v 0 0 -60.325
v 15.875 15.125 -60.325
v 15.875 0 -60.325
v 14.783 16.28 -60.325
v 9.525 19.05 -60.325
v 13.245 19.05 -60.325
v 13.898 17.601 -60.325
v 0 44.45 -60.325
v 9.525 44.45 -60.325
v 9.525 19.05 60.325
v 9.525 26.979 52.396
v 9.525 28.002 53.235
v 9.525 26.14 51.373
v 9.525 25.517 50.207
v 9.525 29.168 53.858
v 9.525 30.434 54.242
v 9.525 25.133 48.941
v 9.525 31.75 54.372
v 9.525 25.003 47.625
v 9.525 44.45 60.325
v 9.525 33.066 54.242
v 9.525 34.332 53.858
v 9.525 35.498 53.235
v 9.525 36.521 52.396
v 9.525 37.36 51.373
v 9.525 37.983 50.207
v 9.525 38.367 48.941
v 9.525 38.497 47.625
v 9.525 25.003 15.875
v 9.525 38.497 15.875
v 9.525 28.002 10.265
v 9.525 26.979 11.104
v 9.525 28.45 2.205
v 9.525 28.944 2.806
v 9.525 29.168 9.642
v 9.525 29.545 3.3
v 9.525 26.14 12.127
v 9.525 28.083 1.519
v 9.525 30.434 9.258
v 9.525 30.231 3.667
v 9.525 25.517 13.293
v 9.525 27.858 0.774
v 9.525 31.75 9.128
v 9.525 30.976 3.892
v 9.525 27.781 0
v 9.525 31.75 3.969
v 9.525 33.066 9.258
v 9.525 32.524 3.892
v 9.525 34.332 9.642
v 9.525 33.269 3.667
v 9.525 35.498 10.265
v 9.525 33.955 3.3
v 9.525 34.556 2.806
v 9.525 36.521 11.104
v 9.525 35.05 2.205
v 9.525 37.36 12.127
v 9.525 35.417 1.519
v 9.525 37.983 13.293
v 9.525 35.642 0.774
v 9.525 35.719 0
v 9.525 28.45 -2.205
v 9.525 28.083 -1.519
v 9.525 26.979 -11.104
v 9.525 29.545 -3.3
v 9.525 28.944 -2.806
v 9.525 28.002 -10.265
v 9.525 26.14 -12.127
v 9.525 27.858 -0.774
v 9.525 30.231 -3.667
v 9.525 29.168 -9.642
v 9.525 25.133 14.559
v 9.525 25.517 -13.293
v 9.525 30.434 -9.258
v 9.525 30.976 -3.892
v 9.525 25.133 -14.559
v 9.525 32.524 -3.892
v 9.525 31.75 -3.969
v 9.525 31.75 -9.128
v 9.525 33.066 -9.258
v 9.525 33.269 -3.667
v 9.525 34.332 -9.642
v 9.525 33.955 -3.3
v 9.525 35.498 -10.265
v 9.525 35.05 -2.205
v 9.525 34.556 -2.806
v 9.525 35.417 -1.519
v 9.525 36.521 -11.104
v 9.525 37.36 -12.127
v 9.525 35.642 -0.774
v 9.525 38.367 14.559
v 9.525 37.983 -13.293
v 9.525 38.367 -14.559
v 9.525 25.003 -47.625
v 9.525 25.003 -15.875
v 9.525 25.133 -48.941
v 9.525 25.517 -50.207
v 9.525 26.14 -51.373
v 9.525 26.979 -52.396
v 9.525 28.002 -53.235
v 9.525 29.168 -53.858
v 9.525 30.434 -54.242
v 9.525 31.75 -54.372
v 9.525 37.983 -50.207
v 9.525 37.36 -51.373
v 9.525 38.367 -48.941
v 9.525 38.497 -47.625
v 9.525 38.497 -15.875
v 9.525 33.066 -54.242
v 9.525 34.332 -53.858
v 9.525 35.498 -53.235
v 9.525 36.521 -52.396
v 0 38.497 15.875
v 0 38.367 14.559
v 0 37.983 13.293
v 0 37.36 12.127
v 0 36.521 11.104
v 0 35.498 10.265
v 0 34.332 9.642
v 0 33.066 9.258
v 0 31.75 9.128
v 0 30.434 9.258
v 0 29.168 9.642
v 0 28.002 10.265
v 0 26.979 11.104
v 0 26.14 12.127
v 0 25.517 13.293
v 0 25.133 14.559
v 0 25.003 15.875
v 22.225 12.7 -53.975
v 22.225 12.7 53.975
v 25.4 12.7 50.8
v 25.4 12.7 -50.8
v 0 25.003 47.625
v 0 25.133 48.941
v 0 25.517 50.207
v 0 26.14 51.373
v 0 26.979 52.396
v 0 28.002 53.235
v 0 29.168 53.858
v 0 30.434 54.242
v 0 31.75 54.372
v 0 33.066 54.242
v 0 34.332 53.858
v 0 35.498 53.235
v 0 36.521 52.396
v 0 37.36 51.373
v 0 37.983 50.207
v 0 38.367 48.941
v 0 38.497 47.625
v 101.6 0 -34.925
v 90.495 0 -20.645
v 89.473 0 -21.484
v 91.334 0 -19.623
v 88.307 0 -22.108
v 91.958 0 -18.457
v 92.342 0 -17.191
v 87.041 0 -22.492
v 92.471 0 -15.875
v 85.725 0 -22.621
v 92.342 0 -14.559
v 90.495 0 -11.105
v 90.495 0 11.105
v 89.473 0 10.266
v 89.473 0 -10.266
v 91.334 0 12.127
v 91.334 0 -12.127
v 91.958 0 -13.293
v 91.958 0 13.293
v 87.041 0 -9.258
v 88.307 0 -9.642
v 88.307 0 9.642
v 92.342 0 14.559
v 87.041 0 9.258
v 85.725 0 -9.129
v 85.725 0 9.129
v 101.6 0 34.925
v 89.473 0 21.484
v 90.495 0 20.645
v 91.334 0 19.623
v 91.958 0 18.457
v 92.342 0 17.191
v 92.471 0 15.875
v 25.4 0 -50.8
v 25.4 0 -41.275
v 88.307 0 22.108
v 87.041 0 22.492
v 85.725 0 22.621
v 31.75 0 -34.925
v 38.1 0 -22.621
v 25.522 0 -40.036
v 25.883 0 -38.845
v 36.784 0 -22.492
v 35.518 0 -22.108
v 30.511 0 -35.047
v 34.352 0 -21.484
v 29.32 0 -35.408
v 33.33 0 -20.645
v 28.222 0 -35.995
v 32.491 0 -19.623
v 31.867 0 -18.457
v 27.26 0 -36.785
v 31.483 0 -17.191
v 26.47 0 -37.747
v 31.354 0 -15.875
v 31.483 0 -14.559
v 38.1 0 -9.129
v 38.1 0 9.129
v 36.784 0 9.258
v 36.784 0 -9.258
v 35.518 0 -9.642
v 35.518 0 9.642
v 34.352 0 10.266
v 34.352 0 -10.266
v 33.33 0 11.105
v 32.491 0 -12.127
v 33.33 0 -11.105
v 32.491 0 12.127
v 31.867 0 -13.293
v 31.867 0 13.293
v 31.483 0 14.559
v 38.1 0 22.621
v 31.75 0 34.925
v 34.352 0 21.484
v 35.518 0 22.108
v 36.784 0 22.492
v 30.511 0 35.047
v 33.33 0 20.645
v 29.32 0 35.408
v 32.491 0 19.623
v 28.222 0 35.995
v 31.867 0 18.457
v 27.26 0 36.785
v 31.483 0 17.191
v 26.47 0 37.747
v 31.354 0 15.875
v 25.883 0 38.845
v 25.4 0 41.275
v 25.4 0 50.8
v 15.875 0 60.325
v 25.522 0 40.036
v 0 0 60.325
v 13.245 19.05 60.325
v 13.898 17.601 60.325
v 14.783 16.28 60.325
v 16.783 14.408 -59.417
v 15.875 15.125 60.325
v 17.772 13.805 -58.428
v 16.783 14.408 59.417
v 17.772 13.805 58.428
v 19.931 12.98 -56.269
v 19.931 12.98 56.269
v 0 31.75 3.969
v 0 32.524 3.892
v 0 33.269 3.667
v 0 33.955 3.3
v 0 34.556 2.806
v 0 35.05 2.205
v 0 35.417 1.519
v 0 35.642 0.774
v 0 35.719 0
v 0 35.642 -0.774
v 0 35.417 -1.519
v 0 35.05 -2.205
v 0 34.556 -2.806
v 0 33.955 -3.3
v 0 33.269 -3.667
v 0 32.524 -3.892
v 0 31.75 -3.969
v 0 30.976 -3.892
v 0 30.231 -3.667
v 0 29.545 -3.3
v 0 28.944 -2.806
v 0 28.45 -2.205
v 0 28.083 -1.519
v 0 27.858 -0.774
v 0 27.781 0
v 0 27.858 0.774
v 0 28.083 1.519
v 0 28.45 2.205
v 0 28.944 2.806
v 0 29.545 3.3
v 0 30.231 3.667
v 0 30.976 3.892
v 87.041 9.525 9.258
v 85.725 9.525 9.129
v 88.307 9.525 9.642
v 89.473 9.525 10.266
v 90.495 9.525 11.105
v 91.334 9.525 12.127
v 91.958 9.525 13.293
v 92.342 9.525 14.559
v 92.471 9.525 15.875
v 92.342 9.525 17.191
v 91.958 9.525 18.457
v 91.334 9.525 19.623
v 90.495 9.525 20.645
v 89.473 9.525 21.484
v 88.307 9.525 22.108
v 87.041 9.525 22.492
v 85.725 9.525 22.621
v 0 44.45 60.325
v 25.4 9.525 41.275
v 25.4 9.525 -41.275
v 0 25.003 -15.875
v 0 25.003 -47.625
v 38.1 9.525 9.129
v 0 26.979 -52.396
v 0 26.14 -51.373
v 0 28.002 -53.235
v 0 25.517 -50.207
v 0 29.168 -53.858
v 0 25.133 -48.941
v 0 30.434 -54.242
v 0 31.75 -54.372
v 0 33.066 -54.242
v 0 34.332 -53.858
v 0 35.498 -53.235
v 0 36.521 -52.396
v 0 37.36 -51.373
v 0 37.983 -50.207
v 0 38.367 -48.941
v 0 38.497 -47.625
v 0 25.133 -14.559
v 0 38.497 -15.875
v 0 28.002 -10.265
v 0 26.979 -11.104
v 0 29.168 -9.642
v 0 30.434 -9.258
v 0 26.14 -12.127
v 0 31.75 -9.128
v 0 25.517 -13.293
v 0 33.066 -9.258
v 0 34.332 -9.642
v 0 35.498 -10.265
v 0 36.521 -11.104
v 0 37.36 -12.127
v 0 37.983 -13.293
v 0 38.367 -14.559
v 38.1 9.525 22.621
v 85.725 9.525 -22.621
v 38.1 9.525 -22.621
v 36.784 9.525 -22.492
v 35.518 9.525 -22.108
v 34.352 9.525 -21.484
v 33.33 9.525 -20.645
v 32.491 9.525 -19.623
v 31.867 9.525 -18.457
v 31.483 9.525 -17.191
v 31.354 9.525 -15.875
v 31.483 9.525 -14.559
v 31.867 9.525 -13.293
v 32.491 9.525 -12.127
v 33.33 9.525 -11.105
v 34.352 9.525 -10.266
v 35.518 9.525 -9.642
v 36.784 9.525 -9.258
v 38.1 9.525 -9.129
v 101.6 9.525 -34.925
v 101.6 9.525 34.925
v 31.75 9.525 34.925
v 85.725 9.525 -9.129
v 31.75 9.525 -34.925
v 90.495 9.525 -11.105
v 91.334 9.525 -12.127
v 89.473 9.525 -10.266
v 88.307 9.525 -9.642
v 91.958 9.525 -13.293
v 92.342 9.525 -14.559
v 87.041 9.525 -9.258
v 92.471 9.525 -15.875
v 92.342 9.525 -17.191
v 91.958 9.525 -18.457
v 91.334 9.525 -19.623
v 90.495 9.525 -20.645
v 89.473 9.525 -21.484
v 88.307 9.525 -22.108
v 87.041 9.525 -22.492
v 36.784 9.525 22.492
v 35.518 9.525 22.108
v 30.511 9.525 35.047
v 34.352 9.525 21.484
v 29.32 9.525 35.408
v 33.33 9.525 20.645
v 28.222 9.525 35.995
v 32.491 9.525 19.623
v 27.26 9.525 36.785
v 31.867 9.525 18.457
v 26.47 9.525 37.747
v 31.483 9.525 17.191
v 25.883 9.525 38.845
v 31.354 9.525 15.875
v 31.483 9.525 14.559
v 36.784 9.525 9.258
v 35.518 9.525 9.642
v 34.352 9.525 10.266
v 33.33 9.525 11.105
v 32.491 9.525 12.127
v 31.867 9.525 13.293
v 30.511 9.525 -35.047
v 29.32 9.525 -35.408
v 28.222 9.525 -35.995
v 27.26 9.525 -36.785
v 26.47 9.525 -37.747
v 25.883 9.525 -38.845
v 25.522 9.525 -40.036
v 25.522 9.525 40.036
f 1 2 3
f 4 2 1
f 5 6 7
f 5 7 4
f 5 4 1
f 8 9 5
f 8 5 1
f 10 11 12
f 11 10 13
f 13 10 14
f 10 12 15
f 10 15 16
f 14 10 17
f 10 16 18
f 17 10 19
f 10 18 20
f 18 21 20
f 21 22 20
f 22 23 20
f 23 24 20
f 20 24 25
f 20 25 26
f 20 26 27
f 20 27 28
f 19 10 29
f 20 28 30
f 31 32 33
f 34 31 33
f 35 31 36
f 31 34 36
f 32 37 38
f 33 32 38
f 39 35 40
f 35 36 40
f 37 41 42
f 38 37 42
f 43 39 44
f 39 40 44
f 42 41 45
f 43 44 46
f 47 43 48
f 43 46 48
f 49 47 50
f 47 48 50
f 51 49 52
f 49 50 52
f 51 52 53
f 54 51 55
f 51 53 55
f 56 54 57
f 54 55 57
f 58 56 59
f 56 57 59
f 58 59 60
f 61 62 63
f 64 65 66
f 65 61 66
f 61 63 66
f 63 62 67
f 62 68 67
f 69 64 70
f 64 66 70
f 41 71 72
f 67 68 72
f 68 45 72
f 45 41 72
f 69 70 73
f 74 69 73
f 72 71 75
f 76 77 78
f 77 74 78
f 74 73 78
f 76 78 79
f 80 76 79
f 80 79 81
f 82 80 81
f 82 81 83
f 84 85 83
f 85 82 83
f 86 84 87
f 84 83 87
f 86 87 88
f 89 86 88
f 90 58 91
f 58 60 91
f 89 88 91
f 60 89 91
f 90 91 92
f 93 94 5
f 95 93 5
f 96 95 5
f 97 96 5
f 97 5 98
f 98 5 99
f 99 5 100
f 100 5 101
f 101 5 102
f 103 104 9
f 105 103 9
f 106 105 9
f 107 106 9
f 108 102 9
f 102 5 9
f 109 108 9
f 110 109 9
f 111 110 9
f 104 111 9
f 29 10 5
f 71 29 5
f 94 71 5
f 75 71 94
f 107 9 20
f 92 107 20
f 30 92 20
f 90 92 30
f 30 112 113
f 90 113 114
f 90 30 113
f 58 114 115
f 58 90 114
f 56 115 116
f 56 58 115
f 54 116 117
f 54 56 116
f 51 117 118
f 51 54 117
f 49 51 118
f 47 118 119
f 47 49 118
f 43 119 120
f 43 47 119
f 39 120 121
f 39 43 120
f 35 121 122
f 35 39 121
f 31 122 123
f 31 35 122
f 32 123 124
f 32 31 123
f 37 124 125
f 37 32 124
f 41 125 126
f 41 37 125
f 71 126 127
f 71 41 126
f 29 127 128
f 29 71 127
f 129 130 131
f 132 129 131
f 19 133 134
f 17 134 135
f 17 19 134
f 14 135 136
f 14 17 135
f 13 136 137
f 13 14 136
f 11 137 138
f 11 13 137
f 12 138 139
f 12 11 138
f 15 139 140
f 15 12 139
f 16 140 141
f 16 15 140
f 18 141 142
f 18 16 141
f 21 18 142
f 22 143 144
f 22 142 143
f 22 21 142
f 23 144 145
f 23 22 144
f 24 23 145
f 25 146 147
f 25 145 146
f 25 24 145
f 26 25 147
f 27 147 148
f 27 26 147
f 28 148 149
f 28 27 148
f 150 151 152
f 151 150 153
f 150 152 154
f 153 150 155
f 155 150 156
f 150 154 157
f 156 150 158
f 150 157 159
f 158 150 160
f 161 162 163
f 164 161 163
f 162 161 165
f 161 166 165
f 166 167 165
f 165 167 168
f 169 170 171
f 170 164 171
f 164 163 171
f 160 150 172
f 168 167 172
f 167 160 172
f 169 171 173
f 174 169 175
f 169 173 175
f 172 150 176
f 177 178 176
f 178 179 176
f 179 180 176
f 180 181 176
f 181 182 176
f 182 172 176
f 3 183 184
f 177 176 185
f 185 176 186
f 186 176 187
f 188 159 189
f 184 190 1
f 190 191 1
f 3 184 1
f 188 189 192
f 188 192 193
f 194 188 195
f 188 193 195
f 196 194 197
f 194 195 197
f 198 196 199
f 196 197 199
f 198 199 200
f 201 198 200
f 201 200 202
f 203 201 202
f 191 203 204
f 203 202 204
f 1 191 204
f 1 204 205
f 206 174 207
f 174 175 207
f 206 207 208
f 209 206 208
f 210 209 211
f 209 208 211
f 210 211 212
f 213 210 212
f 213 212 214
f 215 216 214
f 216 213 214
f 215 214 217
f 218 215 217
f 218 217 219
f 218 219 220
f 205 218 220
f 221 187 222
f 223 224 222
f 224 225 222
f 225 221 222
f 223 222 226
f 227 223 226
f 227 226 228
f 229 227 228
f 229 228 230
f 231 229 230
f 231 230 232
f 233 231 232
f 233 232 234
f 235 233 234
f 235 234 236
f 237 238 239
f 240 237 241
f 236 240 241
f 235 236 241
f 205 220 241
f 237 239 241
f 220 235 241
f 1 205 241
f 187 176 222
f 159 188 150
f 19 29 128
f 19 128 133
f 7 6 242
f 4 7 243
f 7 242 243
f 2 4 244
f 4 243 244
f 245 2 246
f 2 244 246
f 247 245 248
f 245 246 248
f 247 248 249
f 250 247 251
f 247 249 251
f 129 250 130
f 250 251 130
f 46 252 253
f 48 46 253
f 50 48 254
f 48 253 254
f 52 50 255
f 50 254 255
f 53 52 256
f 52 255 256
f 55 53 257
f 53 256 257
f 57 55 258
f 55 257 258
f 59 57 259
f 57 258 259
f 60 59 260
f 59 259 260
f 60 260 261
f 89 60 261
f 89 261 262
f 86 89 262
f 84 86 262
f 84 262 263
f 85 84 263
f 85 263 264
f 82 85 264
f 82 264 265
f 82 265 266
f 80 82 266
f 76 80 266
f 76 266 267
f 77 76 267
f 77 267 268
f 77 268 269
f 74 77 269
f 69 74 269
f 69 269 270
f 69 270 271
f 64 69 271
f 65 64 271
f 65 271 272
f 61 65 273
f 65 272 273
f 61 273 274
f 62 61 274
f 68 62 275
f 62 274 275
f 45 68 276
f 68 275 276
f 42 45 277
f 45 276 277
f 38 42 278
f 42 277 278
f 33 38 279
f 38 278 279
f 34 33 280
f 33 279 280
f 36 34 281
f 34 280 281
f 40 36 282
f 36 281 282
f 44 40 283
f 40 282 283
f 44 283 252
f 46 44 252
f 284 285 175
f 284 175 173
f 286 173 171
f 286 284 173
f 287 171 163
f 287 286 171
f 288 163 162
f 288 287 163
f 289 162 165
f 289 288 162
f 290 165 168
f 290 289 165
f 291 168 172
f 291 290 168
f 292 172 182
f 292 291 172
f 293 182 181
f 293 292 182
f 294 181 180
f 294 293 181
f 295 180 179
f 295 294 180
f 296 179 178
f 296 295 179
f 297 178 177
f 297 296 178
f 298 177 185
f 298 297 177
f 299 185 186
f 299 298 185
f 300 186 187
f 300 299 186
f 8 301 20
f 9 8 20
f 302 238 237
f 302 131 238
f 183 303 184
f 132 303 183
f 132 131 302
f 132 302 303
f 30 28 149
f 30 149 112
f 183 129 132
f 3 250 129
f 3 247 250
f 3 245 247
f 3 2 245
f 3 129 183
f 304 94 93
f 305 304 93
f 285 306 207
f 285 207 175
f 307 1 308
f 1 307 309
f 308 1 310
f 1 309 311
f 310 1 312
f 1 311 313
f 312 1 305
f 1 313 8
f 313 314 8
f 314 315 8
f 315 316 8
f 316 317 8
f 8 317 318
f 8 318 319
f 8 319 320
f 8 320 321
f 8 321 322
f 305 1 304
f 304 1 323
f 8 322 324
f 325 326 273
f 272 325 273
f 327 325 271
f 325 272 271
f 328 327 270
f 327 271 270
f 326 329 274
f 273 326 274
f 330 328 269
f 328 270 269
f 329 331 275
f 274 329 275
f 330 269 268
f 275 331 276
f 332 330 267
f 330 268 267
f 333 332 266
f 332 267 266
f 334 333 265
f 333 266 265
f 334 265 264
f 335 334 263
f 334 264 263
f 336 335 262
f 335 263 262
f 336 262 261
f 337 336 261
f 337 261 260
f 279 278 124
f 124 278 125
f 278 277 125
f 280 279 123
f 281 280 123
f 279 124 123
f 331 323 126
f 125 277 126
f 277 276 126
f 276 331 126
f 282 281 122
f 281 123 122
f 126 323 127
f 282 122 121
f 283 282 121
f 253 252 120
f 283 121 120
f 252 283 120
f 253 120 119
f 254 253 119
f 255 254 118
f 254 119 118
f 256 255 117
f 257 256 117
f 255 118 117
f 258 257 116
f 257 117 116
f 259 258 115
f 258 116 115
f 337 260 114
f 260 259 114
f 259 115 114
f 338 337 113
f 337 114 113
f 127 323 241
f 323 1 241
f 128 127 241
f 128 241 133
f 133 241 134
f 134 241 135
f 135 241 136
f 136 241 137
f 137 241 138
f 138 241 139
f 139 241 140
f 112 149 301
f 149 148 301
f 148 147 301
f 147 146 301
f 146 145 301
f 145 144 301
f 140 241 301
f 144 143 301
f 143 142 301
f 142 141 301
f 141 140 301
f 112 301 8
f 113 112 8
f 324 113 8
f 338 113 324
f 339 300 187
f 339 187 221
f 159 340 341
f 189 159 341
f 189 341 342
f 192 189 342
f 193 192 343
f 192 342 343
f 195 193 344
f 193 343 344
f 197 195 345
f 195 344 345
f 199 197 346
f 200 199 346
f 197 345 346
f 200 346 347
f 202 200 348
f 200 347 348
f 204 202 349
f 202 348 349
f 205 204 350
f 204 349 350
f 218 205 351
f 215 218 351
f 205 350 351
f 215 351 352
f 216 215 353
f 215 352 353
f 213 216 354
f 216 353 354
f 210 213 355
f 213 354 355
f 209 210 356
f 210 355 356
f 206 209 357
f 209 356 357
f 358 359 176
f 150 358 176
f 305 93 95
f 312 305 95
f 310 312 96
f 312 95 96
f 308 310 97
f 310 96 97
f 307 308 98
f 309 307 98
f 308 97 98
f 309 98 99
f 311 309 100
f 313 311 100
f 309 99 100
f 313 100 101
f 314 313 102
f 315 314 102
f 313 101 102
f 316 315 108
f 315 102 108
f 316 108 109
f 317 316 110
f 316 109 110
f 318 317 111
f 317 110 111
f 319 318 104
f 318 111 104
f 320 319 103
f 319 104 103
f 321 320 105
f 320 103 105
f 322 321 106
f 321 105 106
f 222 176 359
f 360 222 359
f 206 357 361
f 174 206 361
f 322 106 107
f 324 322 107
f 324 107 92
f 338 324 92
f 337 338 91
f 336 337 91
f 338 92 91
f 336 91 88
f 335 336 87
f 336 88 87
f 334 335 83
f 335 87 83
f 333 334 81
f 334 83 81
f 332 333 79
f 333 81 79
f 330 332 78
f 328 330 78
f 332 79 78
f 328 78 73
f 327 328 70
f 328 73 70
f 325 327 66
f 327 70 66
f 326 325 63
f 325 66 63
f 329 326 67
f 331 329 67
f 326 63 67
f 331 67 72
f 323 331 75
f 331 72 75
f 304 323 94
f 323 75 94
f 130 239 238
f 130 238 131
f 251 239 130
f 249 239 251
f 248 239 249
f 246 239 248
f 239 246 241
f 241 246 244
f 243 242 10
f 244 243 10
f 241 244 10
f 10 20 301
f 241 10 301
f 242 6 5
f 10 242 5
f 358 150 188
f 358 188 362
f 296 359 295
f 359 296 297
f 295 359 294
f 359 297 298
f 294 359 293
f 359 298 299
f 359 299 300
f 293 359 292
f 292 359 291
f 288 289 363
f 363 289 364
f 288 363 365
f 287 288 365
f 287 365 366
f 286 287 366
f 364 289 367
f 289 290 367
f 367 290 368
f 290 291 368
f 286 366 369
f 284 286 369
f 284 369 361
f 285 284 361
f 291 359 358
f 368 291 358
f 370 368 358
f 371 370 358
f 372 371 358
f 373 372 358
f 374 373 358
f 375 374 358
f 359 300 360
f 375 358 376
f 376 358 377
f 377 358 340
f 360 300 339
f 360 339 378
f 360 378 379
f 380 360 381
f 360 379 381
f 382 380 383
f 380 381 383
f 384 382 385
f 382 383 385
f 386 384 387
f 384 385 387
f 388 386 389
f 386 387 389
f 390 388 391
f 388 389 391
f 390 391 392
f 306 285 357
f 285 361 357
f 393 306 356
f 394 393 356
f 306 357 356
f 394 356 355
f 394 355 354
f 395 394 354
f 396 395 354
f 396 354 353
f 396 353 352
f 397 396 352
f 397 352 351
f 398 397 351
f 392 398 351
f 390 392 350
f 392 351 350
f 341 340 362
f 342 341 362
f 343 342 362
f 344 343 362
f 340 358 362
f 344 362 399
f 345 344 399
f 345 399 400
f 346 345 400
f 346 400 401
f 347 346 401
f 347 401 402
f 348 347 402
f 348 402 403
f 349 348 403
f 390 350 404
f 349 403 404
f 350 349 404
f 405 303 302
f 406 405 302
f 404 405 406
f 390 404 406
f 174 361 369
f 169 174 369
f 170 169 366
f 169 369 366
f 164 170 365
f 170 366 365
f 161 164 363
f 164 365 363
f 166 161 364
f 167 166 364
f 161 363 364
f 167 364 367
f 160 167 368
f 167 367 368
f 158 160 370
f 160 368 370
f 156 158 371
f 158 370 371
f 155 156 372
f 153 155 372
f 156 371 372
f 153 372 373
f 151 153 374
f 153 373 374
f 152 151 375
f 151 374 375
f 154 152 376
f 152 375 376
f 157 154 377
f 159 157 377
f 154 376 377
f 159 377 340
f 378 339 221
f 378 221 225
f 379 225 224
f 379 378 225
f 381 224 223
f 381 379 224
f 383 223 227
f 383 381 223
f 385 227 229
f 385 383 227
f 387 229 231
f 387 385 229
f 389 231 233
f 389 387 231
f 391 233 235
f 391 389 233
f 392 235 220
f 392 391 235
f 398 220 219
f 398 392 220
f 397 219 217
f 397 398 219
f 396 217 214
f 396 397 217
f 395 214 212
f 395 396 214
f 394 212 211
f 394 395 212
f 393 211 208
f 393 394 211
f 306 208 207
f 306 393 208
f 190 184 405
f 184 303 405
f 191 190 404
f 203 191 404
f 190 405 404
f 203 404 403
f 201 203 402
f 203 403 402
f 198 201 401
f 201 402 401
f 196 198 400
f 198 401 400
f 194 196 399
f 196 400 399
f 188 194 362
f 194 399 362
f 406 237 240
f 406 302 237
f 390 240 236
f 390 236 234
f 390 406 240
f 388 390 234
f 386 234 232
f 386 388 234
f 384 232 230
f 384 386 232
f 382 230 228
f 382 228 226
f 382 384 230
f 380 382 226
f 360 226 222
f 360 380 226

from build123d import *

# Parameters (mm, degrees)
BASESTEELANGLE_DEPTH    = 60.325
CUT_EXTRUDE1_DEPTH      = 1
CUT_EXTRUDE1_DEPTH_BACK = 121.65
CUT_EXTRUDE3_DEPTH      = 13.7
SKETCH5_W               = 76.2
SKETCH5_H               = 6.35
CUT_EXTRUDE4_DEPTH      = 121.65
SKETCH6_W               = 9.525
SKETCH6_H               = 28.575
CUT_EXTRUDE5_DEPTH      = 121.65
CUT_EXTRUDE6_DEPTH      = 10.525
F_3_8_16_TAPPED_HOLE1_D = 7.9375
SKETCH11_W              = 25.4
SKETCH11_H              = 9.525
CUT_EXTRUDE8_DEPTH      = 76.2
FILLET2_R               = 6.35
CHAMFER3_SIZE           = 9.525


with BuildPart() as part:
    # Sketch1 → BaseSteelAngle (new body, symmetric)
    with BuildSketch(Plane.XY):
        with BuildLine():
            Line((0, 0), (0, 101.6))
            Line((0, 101.6), (3.18008, 101.6))
            ThreePointArc((3.18008, 101.6), (9.911679988, 98.811679988), (12.7, 92.08008))
            Line((12.7, 92.08008), (12.7, 22.225))
            ThreePointArc((12.7, 22.225), (15.489807909, 15.489807909), (22.225, 12.7))
            Line((22.225, 12.7), (101.6, 12.7))
            Line((101.6, 12.7), (101.6, 0))
            Line((101.6, 0), (0, 0))
        make_face()
    extrude(amount=BASESTEELANGLE_DEPTH, both=True)

    # Sketch2 → Cut-Extrude1 (cut, two sides)
    with BuildSketch(Plane.XY.offset(60.325)) as cut_extrude1_sk:
        Polygon((-254.455417258, 44.45), (-4.112271749, 44.45), (18.408340367, 44.45), (268.751485876, 44.45), (268.751485876, 545.136291018), (-254.455417258, 545.136291018), align=None)
    extrude(amount=CUT_EXTRUDE1_DEPTH, mode=Mode.SUBTRACT)
    extrude(cut_extrude1_sk.sketch, amount=-CUT_EXTRUDE1_DEPTH_BACK, mode=Mode.SUBTRACT)

    # Sketch4 → Cut-Extrude3 (cut, through all)
    with BuildSketch(Plane(origin=(78.166939161, 12.7, 45.281727152), x_dir=(0, 0, 1), z_dir=(0, 1, 0))):
        with BuildLine():
            Line((-67.902967152, 7.558060839), (-67.902967152, -40.066939161))
            ThreePointArc((-67.902967152, -40.066939161), (-61.156727152, -46.813179161), (-54.410487152, -40.066939161))
            Line((-54.410487152, -40.066939161), (-54.410487152, 7.558060839))
            ThreePointArc((-54.410487152, 7.558060839), (-61.156727152, 14.304300839), (-67.902967152, 7.558060839))
        make_face()
    cut_extrude3 = extrude(amount=-CUT_EXTRUDE3_DEPTH, mode=Mode.SUBTRACT)

    # Mirror1: Cut-Extrude3 across plane
    add(cut_extrude3.mirror(Plane.XY), mode=Mode.SUBTRACT)

    # Sketch5 → Cut-Extrude4 (cut, through all)
    with BuildSketch(Plane(origin=(0, 0, -60.325), x_dir=(-1, 0, 0), z_dir=(0, 0, -1))):
        with Locations((-63.5, 12.7)):
            Rectangle(SKETCH5_W, SKETCH5_H)
    extrude(amount=-CUT_EXTRUDE4_DEPTH, mode=Mode.SUBTRACT)

    # Sketch6 → Cut-Extrude5 (cut, through all)
    with BuildSketch(Plane(origin=(0, 0, -60.325), x_dir=(-1, 0, 0), z_dir=(0, 0, -1))):
        with Locations((-14.2875, 33.3375)):
            Rectangle(SKETCH6_W, SKETCH6_H)
    extrude(amount=-CUT_EXTRUDE5_DEPTH, mode=Mode.SUBTRACT)

    # Sketch7 → Cut-Extrude6 (cut, through all)
    with BuildSketch(Plane(origin=(9.525, 0, 0), x_dir=(0, 0, -1), z_dir=(1, 0, 0))):
        with BuildLine():
            Line((15.875, 25.003125), (47.625, 25.003125))
            ThreePointArc((47.625, 25.003125), (54.371875, 31.75), (47.625, 38.496875))
            Line((47.625, 38.496875), (15.875, 38.496875))
            ThreePointArc((15.875, 38.496875), (9.128125, 31.75), (15.875, 25.003125))
        make_face()
    cut_extrude6 = extrude(amount=-CUT_EXTRUDE6_DEPTH, mode=Mode.SUBTRACT)

    # Mirror2: Cut-Extrude6 across plane
    add(cut_extrude6.mirror(Plane.XY), mode=Mode.SUBTRACT)

    # 3/8-16 Tapped Hole1 (through all)
    with Locations(Plane(origin=(9.525, 0, 0), x_dir=(0, 0, -1), z_dir=(1, 0, 0))):
        with Locations((0, 31.75)):
            Hole(F_3_8_16_TAPPED_HOLE1_D / 2)

    # Sketch11 → Cut-Extrude8 (cut)
    with BuildSketch(Plane(origin=(101.6, 0, 0), x_dir=(0, 0, -1), z_dir=(1, 0, 0))):
        with Locations((47.625, 4.7625)):
            Rectangle(SKETCH11_W, SKETCH11_H)
        with Locations((-47.625, 4.7625)):
            Rectangle(SKETCH11_W, SKETCH11_H)
    extrude(amount=-CUT_EXTRUDE8_DEPTH, mode=Mode.SUBTRACT)

    # Fillet2
    fillet2_edges = [part.edges().sort_by_distance(p)[0] for p in [
        (25.4, 4.7625, -34.925),
        (25.4, 4.7625, 34.925),
    ]]
    fillet(fillet2_edges, radius=FILLET2_R)

    # Chamfer3
    chamfer3_edges = [part.edges().sort_by_distance(p)[0] for p in [
        (25.4, 6.35, 60.325),
        (25.4, 6.35, -60.325),
    ]]
    chamfer(chamfer3_edges, length=CHAMFER3_SIZE)


solid = part.part
